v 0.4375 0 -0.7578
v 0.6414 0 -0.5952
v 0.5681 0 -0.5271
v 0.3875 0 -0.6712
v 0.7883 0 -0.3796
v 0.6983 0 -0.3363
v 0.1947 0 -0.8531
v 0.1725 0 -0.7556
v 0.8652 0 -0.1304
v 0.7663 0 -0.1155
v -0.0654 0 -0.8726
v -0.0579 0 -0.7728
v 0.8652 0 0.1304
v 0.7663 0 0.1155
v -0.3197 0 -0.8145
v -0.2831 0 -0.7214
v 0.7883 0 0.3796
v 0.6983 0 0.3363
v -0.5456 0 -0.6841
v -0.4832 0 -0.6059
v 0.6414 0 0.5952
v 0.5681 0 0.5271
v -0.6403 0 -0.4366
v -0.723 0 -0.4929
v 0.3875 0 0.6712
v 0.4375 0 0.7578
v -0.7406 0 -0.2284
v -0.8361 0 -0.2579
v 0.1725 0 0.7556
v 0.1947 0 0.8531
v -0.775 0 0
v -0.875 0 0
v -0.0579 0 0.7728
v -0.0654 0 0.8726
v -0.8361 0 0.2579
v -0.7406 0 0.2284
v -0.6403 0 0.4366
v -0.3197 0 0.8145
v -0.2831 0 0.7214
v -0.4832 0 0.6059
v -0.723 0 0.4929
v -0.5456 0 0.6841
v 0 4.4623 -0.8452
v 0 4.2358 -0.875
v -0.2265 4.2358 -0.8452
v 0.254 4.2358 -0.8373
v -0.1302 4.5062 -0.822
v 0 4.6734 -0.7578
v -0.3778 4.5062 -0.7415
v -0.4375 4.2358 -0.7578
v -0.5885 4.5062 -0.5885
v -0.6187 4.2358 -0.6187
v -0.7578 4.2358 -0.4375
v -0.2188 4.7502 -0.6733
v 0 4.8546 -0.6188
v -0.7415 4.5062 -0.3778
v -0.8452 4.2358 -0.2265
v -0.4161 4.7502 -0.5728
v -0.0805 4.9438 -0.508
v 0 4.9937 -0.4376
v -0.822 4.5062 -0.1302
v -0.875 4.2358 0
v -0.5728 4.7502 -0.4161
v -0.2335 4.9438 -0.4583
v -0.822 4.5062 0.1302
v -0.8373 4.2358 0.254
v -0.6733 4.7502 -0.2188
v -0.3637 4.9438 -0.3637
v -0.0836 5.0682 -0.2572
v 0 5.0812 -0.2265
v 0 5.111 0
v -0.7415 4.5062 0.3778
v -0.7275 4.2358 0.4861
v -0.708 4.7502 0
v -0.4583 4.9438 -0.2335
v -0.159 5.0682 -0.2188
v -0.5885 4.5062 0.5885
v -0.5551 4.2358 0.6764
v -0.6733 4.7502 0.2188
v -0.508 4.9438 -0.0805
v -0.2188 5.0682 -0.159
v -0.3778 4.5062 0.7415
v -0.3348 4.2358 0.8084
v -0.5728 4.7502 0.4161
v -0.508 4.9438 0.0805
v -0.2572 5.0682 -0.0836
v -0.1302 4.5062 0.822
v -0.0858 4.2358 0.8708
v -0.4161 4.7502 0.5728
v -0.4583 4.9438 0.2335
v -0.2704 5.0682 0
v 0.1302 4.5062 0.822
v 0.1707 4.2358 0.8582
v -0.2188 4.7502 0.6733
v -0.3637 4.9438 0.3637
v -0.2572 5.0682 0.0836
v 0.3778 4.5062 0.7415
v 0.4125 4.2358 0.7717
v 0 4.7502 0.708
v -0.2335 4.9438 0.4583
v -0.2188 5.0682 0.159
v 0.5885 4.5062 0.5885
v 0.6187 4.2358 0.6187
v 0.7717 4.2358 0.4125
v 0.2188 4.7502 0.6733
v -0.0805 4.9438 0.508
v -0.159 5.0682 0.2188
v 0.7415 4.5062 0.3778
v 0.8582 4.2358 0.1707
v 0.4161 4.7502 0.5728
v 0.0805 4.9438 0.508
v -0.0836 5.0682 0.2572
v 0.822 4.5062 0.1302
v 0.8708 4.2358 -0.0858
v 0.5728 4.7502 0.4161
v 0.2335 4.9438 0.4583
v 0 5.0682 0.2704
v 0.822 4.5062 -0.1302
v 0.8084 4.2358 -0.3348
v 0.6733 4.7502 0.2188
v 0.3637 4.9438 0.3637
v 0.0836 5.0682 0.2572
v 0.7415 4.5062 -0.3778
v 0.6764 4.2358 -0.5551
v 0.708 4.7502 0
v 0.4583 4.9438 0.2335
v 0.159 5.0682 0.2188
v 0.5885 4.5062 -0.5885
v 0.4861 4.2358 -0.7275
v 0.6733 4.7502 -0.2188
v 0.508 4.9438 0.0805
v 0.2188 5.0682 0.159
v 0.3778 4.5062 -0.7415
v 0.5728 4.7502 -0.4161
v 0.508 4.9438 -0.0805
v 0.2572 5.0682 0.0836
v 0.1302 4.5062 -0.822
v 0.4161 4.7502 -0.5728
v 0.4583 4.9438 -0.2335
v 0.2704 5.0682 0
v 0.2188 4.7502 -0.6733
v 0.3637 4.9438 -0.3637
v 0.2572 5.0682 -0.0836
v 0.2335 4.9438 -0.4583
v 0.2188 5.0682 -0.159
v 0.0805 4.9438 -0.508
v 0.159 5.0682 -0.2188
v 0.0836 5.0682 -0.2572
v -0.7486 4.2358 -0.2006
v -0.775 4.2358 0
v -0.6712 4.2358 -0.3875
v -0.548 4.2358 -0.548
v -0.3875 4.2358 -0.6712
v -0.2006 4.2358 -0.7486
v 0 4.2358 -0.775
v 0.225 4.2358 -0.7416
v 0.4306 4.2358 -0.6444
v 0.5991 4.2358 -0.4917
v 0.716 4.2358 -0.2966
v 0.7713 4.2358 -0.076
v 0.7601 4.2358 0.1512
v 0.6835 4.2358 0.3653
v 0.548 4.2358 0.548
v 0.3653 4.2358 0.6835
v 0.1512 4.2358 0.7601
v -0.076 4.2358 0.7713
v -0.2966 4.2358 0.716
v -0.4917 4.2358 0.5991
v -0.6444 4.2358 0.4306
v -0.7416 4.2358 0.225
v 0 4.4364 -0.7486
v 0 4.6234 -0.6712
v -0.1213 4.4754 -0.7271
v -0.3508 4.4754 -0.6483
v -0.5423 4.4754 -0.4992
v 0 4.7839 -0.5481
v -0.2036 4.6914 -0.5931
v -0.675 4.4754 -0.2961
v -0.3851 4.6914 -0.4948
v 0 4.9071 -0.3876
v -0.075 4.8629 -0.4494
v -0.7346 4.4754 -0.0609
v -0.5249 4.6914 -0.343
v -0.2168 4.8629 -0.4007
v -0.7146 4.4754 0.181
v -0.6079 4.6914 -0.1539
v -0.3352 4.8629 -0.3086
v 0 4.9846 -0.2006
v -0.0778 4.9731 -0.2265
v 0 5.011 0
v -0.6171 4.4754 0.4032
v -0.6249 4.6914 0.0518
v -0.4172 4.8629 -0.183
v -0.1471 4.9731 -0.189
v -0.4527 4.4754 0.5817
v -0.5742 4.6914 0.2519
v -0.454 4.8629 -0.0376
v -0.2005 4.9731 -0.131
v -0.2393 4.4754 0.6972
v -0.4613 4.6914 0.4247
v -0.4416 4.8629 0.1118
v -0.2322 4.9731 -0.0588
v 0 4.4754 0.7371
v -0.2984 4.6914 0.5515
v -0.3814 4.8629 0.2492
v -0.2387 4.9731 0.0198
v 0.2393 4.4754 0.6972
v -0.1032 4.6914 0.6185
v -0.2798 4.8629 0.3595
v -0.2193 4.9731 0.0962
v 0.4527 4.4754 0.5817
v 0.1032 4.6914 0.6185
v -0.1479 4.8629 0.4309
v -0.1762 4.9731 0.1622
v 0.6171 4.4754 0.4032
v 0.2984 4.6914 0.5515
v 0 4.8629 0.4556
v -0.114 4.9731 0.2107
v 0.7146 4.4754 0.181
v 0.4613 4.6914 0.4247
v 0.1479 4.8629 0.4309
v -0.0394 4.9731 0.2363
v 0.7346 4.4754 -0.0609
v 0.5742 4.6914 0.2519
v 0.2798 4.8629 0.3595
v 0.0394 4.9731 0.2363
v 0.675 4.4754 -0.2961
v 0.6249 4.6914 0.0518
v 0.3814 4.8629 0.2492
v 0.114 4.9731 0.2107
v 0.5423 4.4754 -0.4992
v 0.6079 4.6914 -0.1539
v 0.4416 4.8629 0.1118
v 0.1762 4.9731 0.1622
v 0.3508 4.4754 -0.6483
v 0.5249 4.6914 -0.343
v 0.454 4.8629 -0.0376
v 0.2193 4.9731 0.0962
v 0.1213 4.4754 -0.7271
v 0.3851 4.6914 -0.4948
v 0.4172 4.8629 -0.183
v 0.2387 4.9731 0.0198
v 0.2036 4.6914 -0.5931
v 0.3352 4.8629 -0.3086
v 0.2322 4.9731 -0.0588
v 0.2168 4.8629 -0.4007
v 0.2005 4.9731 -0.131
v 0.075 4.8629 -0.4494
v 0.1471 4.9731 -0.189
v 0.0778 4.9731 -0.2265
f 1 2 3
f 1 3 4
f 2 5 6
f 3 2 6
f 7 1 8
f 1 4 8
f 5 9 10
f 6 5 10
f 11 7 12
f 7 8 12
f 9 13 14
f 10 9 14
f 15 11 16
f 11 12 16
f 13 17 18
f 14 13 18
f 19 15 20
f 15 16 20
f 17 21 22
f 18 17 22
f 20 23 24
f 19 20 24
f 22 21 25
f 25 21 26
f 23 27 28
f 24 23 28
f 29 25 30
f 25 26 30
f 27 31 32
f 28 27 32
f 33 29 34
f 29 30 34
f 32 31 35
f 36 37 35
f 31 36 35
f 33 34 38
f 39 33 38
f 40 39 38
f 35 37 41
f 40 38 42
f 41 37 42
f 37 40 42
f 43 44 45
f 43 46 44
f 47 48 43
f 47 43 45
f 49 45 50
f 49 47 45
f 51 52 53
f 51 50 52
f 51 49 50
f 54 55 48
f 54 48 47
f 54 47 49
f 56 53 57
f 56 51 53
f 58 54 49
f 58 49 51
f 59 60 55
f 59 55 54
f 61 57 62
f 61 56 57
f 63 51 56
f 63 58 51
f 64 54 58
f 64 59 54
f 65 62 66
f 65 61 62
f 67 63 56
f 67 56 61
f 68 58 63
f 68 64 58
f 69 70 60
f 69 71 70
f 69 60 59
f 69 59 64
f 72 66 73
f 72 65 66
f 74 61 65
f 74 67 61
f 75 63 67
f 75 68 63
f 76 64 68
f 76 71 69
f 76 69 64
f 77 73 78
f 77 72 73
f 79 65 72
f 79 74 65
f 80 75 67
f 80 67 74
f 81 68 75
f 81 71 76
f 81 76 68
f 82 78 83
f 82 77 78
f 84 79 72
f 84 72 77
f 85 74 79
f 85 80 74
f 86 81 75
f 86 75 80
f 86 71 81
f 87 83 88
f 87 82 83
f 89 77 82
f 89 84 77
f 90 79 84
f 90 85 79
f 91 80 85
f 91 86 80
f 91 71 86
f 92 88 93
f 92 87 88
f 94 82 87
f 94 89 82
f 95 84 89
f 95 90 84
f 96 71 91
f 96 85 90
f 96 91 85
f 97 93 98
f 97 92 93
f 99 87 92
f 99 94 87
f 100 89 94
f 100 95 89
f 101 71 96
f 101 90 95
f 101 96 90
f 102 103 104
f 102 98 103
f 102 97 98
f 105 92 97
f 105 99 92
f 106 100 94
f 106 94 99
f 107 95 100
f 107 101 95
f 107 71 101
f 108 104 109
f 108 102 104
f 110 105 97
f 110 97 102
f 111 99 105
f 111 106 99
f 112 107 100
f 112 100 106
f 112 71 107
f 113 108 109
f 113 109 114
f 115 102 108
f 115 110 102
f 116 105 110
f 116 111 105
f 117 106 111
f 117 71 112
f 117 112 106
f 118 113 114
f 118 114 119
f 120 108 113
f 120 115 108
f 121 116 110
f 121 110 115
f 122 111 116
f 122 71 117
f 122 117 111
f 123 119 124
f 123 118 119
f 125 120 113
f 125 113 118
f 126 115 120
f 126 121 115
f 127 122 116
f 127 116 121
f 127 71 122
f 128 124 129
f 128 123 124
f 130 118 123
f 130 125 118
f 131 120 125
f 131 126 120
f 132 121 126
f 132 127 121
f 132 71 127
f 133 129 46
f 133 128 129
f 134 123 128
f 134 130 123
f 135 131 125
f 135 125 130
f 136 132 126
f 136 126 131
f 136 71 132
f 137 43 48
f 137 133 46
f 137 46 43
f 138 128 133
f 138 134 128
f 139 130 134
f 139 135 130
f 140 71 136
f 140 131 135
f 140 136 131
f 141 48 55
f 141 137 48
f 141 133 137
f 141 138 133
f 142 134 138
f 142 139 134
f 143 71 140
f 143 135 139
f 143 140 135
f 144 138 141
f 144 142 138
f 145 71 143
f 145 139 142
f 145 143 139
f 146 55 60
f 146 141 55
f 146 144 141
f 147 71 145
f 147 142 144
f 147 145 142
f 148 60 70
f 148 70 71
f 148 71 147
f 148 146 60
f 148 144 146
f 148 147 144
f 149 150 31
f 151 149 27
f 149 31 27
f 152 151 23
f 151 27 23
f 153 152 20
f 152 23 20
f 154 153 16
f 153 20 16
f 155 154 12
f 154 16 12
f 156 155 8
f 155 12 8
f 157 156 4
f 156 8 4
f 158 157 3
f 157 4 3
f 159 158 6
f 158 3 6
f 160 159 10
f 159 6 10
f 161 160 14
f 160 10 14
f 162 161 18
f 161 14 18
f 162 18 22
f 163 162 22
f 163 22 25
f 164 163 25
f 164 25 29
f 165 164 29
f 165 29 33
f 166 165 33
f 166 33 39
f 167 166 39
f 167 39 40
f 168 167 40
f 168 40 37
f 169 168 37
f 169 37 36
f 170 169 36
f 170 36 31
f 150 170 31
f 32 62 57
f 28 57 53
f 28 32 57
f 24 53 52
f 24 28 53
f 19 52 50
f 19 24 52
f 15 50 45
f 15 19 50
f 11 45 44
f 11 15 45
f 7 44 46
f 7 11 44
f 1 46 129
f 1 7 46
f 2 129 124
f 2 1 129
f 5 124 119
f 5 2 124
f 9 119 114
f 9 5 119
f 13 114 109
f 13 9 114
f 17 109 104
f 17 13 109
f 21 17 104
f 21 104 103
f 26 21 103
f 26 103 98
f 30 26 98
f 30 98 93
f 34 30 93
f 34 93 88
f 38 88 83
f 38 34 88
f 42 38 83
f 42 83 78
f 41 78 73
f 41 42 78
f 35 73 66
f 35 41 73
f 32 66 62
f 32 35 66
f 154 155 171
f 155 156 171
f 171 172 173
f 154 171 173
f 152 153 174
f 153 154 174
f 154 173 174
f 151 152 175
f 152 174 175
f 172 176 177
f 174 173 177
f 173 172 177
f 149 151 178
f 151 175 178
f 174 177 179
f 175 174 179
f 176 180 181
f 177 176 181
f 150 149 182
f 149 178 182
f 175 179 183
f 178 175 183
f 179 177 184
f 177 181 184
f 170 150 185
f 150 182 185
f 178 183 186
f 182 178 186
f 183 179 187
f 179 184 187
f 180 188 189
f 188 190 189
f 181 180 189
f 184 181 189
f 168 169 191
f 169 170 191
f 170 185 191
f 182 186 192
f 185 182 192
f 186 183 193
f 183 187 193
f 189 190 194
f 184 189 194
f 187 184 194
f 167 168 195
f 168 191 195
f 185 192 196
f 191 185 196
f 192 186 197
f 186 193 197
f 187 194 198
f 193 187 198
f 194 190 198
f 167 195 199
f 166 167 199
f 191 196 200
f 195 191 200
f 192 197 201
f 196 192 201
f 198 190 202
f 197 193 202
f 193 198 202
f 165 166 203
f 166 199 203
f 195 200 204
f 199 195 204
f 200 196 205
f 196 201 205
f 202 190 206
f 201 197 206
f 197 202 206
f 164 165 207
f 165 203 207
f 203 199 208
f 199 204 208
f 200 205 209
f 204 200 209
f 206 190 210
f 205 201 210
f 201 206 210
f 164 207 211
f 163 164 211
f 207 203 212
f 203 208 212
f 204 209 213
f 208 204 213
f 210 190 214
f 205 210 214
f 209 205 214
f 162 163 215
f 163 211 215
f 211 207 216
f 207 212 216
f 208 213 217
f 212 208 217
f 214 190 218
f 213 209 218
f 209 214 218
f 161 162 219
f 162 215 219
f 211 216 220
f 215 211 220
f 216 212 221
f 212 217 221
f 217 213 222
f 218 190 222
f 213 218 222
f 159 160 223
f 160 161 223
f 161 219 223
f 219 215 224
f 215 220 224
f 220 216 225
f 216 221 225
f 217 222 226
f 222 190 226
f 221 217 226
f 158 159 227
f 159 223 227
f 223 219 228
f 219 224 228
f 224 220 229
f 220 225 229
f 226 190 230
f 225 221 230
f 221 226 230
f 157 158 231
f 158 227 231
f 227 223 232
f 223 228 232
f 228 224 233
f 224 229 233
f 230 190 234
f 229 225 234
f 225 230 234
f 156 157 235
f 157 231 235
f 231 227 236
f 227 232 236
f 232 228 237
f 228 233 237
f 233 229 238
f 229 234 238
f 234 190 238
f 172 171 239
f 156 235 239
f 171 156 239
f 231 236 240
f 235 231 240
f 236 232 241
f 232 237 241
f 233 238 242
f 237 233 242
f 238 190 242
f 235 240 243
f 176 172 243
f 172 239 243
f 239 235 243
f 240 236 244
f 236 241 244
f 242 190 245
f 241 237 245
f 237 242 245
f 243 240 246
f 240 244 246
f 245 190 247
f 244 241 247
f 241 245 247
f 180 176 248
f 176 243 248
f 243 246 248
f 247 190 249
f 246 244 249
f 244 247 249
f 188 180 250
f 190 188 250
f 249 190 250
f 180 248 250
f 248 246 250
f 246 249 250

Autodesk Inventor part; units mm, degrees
ref_plane "YZ Plane" through (0, 0, 0) normal (1, 0, 0) x (0, 1, 0)
ref_plane "XZ Plane" through (0, 0, 0) normal (0, 1, 0) x (-1, 0, 0)
ref_plane "XY Plane" through (0, 0, 0) normal (0, 0, 1) x (1, 0, 0)
sketch "Sketch1" plane through (0, 0, 0) normal (0, 1, 0) x (-1, 0, 0)
  circle A0 centre (0, 0) radius 0.875
  dimension "d0" = 1.75
extrude "Extrusion1" add sketch "Sketch1" along normal blind 5.13
sketch "Sketch2" plane through (0, 0, 0) normal (1, 0, 0) x (0, 1, 0)
  line L0 (5.13, -0.875) -> (5.13, 0.875) projected
  arc A0 (5.13, 0.875) -> (5.13, -0.875) centre (5.111, 0) ccw
  line L1 (4.2358, 0) -> (4.2358, 0.875)
  line L2 (0, 0.875) -> (5.13, 0.875) projected
  line L3 (0, -0.875) -> (5.13, -0.875) projected
  arc A1 (4.2358, -0.875) -> (4.2358, 0.875) centre (4.236, 0) ccw
  line L4 (5.111, 0) -> (4.236, 0)
  line L5 (5.13, 0.875) -> (4.2358, 0.875)
  line L6 (4.2358, 0.875) -> (4.2358, -0.875)
  line L7 (4.2358, -0.875) -> (5.13, -0.875)
  line L8 (5.13, -0.875) -> (5.13, 0.875)
  line L9 (5.3365, 0) -> (4.983, 0)
  point P0 (0, 0)
  point P1 (5.13, 0)
revolve "Revolution1" cut sketch "Sketch2" angle 360 about axis through (0, 5.111, 0) along (0, -1, 0) picked at (5.0364, -0.5818) contours A0 A1 L9 L0 | L3 A1 A0
shell "Shell1" thickness 0.1 removed faces 1 at (0.2866, 0, -0.1766)
properties part number "continuacion medio"
